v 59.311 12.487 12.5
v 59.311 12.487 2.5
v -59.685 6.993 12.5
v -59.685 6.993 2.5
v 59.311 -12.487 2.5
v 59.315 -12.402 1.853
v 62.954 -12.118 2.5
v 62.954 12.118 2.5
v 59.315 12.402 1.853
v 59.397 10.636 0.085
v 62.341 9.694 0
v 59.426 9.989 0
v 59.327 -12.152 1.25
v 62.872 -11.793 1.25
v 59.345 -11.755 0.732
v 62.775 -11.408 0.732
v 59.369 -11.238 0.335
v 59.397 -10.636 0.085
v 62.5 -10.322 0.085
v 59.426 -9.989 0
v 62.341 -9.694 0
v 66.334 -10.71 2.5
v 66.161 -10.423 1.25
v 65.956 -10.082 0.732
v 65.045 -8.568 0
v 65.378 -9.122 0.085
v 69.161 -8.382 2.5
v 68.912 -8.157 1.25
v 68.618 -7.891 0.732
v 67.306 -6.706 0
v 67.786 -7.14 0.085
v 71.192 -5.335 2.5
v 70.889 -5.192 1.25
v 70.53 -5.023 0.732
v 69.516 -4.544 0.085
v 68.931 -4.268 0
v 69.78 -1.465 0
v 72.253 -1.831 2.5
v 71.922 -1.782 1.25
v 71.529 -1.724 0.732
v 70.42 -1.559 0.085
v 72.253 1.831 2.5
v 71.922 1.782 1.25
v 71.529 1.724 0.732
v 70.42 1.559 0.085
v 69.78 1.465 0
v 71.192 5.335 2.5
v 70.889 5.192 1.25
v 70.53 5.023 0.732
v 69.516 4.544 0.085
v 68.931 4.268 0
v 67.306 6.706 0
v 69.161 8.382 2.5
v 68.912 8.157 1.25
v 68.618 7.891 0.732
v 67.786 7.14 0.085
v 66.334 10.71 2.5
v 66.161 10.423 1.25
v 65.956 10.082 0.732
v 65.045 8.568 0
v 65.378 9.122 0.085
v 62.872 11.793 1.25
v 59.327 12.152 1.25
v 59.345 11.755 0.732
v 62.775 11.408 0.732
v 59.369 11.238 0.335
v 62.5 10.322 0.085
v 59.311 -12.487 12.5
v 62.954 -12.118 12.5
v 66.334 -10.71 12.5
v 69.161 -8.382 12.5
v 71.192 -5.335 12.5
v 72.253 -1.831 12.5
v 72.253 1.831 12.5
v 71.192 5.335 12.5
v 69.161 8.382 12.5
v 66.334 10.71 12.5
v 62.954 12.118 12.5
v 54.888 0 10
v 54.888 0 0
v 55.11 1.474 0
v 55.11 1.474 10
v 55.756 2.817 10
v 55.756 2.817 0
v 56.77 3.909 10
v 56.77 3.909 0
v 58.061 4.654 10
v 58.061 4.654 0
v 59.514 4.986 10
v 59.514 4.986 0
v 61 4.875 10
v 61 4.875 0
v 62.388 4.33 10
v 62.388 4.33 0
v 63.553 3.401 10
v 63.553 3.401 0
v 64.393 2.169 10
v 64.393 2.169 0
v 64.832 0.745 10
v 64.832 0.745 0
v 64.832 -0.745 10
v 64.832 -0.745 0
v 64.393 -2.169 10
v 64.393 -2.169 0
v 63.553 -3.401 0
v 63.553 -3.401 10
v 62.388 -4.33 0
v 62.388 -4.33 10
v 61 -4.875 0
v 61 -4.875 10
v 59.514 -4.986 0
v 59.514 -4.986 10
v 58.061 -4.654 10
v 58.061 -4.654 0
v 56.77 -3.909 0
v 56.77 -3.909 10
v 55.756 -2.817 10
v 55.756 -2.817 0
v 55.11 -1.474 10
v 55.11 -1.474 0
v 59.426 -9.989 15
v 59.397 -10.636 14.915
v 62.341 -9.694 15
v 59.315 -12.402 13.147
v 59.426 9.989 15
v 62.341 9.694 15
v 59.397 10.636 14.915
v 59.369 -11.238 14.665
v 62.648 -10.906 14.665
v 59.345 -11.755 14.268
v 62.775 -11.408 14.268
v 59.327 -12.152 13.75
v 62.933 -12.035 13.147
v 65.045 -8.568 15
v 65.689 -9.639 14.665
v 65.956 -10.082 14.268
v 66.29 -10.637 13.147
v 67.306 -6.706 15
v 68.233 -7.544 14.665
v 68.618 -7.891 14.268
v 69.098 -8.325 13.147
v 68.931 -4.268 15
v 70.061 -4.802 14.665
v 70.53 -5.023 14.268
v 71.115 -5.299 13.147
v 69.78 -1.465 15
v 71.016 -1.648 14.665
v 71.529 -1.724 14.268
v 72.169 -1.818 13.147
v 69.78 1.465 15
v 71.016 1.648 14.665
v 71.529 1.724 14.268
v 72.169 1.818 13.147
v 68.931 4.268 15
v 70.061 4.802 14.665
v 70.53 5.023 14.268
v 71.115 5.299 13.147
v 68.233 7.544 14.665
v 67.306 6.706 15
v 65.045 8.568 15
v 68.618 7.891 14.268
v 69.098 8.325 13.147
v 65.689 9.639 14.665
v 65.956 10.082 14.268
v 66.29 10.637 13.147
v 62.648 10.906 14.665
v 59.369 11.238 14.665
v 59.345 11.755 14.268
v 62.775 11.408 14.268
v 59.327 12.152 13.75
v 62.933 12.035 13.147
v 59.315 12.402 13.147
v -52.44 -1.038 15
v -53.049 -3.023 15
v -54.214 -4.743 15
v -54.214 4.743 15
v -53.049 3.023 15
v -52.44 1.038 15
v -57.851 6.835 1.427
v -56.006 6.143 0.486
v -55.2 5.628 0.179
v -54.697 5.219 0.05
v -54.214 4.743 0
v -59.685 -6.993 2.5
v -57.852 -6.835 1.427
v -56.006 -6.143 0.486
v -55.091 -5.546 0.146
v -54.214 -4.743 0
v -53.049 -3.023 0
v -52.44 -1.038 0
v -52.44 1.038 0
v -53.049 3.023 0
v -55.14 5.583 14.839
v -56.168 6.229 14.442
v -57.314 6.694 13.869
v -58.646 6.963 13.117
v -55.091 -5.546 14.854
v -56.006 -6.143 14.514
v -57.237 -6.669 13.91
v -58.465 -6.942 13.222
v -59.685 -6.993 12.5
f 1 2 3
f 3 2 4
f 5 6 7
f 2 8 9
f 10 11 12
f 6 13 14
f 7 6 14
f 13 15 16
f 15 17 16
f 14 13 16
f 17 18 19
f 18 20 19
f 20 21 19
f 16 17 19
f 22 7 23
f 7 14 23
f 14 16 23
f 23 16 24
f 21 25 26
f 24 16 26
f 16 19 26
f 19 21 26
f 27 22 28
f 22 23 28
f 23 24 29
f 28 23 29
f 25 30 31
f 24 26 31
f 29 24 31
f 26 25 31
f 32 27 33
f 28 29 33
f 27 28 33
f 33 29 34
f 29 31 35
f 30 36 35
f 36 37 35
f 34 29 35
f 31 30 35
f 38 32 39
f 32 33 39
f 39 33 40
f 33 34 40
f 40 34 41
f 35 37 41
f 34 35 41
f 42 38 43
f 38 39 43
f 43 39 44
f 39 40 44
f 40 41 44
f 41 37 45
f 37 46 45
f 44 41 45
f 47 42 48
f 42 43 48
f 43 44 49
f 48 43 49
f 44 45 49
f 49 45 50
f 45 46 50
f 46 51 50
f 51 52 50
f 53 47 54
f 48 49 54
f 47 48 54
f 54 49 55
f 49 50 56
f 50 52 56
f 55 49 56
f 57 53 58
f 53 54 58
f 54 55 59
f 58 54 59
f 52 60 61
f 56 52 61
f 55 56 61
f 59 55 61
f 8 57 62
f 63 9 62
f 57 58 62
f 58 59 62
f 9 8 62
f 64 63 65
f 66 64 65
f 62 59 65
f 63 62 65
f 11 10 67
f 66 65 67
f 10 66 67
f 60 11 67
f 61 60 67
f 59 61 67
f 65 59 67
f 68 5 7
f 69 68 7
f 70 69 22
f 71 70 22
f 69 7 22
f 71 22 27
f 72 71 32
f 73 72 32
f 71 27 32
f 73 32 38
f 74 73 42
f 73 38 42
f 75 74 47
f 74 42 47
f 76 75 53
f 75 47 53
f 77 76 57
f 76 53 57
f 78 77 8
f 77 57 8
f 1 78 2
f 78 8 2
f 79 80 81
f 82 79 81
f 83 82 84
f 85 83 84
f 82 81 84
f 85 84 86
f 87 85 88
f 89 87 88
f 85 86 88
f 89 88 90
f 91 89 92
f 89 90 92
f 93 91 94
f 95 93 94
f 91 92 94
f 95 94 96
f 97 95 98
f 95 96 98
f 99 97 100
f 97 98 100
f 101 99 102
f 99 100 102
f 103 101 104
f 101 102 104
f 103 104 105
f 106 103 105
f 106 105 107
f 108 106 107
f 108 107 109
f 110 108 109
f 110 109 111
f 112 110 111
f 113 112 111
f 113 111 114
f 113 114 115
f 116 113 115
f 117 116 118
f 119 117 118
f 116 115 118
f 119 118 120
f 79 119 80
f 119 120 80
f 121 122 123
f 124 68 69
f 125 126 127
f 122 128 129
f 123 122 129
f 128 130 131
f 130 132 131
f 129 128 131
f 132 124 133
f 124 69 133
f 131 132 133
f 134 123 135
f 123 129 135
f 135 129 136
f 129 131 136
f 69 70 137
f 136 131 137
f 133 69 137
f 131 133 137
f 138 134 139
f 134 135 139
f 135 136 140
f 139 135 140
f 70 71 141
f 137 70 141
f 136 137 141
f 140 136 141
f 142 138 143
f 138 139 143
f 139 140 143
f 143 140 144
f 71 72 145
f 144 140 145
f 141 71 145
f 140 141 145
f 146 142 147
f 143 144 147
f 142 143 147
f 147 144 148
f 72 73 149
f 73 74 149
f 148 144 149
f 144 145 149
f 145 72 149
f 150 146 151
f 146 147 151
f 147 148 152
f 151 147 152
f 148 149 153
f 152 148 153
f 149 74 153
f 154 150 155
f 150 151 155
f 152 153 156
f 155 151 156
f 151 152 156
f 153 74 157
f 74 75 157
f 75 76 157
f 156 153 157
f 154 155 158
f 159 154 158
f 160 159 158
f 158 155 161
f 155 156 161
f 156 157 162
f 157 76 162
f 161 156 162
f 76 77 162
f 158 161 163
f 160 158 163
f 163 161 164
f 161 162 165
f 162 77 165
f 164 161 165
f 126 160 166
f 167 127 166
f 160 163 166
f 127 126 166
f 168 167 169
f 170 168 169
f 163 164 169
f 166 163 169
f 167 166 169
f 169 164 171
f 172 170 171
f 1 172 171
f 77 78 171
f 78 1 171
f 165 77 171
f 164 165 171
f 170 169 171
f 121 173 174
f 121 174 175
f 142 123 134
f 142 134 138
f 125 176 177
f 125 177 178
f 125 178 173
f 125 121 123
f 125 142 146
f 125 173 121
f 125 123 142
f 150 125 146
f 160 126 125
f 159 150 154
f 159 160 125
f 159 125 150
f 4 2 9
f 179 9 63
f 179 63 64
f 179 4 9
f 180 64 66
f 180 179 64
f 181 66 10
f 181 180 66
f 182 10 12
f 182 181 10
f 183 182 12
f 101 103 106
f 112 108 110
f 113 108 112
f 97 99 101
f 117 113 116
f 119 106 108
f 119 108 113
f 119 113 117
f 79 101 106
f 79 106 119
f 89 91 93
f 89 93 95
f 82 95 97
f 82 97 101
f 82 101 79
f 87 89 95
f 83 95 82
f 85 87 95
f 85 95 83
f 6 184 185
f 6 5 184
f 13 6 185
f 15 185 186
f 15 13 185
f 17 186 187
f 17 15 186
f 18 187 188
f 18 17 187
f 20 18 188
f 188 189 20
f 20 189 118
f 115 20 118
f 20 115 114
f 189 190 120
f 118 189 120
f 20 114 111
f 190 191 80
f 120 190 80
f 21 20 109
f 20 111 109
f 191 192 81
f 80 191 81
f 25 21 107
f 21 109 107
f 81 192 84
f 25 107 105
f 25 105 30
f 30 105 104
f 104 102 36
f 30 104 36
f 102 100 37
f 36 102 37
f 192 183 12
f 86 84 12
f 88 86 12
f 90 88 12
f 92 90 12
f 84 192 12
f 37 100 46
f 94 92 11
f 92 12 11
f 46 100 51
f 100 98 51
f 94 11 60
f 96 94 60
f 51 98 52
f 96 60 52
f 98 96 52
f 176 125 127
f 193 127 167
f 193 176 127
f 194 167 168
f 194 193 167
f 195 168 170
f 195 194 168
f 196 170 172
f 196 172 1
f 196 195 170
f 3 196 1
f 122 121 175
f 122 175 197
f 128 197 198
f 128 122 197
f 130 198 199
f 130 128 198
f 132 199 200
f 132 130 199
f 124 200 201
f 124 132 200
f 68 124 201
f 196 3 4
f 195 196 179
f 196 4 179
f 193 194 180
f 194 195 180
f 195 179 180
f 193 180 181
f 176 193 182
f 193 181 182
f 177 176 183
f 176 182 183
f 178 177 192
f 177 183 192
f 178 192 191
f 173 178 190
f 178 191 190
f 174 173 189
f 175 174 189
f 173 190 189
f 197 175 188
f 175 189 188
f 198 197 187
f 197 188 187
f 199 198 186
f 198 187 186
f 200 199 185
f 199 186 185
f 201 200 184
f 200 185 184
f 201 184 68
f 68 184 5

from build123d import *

# Parameters (mm, degrees)
BOSS_EXTRUDE1_DEPTH = 15
SKETCH2_R           = 5
CUT_EXTRUDE1_DEPTH  = 10
FILLET1_R           = 2.5


with BuildPart() as part:
    # Sketch1 → Boss-Extrude1 (new body)
    with BuildSketch(Plane.XY):
        with BuildLine():
            ThreePointArc((-59.685185955, 6.992550832), (-52.362334802, 0), (-59.685185955, -6.992550832))
            Line((-59.685185955, -6.992550832), (59.311145469, -12.486697922))
            ThreePointArc((59.311145469, -12.486697922), (72.387665198, 1.24e-07), (59.311145222, 12.486697911))
            Line((59.311145222, 12.486697911), (-59.685185955, 6.992550832))
        make_face()
    extrude(amount=BOSS_EXTRUDE1_DEPTH)

    # Sketch2 → Cut-Extrude1 (cut)
    with BuildSketch(Plane(origin=(0, 0, 0), x_dir=(-1, 0, 0), z_dir=(0, 0, -1))):
        with Locations((-59.887665198, 0)):
            Circle(SKETCH2_R)
    extrude(amount=-CUT_EXTRUDE1_DEPTH, mode=Mode.SUBTRACT)

    # Fillet1
    fillet1_edges = [part.edges().sort_by_distance(p)[0] for p in [
        (72.387665198, 1.24e-07, 15),
        (-0.187020366, 9.739624371, 15),
        (-0.187020243, -9.739624377, 15),
        (-0.187020366, 9.739624371, 0),
        (72.387665198, 1.24e-07, 0),
        (-0.187020243, -9.739624377, 0),
    ]]
    fillet(fillet1_edges, radius=FILLET1_R)


solid = part.part
